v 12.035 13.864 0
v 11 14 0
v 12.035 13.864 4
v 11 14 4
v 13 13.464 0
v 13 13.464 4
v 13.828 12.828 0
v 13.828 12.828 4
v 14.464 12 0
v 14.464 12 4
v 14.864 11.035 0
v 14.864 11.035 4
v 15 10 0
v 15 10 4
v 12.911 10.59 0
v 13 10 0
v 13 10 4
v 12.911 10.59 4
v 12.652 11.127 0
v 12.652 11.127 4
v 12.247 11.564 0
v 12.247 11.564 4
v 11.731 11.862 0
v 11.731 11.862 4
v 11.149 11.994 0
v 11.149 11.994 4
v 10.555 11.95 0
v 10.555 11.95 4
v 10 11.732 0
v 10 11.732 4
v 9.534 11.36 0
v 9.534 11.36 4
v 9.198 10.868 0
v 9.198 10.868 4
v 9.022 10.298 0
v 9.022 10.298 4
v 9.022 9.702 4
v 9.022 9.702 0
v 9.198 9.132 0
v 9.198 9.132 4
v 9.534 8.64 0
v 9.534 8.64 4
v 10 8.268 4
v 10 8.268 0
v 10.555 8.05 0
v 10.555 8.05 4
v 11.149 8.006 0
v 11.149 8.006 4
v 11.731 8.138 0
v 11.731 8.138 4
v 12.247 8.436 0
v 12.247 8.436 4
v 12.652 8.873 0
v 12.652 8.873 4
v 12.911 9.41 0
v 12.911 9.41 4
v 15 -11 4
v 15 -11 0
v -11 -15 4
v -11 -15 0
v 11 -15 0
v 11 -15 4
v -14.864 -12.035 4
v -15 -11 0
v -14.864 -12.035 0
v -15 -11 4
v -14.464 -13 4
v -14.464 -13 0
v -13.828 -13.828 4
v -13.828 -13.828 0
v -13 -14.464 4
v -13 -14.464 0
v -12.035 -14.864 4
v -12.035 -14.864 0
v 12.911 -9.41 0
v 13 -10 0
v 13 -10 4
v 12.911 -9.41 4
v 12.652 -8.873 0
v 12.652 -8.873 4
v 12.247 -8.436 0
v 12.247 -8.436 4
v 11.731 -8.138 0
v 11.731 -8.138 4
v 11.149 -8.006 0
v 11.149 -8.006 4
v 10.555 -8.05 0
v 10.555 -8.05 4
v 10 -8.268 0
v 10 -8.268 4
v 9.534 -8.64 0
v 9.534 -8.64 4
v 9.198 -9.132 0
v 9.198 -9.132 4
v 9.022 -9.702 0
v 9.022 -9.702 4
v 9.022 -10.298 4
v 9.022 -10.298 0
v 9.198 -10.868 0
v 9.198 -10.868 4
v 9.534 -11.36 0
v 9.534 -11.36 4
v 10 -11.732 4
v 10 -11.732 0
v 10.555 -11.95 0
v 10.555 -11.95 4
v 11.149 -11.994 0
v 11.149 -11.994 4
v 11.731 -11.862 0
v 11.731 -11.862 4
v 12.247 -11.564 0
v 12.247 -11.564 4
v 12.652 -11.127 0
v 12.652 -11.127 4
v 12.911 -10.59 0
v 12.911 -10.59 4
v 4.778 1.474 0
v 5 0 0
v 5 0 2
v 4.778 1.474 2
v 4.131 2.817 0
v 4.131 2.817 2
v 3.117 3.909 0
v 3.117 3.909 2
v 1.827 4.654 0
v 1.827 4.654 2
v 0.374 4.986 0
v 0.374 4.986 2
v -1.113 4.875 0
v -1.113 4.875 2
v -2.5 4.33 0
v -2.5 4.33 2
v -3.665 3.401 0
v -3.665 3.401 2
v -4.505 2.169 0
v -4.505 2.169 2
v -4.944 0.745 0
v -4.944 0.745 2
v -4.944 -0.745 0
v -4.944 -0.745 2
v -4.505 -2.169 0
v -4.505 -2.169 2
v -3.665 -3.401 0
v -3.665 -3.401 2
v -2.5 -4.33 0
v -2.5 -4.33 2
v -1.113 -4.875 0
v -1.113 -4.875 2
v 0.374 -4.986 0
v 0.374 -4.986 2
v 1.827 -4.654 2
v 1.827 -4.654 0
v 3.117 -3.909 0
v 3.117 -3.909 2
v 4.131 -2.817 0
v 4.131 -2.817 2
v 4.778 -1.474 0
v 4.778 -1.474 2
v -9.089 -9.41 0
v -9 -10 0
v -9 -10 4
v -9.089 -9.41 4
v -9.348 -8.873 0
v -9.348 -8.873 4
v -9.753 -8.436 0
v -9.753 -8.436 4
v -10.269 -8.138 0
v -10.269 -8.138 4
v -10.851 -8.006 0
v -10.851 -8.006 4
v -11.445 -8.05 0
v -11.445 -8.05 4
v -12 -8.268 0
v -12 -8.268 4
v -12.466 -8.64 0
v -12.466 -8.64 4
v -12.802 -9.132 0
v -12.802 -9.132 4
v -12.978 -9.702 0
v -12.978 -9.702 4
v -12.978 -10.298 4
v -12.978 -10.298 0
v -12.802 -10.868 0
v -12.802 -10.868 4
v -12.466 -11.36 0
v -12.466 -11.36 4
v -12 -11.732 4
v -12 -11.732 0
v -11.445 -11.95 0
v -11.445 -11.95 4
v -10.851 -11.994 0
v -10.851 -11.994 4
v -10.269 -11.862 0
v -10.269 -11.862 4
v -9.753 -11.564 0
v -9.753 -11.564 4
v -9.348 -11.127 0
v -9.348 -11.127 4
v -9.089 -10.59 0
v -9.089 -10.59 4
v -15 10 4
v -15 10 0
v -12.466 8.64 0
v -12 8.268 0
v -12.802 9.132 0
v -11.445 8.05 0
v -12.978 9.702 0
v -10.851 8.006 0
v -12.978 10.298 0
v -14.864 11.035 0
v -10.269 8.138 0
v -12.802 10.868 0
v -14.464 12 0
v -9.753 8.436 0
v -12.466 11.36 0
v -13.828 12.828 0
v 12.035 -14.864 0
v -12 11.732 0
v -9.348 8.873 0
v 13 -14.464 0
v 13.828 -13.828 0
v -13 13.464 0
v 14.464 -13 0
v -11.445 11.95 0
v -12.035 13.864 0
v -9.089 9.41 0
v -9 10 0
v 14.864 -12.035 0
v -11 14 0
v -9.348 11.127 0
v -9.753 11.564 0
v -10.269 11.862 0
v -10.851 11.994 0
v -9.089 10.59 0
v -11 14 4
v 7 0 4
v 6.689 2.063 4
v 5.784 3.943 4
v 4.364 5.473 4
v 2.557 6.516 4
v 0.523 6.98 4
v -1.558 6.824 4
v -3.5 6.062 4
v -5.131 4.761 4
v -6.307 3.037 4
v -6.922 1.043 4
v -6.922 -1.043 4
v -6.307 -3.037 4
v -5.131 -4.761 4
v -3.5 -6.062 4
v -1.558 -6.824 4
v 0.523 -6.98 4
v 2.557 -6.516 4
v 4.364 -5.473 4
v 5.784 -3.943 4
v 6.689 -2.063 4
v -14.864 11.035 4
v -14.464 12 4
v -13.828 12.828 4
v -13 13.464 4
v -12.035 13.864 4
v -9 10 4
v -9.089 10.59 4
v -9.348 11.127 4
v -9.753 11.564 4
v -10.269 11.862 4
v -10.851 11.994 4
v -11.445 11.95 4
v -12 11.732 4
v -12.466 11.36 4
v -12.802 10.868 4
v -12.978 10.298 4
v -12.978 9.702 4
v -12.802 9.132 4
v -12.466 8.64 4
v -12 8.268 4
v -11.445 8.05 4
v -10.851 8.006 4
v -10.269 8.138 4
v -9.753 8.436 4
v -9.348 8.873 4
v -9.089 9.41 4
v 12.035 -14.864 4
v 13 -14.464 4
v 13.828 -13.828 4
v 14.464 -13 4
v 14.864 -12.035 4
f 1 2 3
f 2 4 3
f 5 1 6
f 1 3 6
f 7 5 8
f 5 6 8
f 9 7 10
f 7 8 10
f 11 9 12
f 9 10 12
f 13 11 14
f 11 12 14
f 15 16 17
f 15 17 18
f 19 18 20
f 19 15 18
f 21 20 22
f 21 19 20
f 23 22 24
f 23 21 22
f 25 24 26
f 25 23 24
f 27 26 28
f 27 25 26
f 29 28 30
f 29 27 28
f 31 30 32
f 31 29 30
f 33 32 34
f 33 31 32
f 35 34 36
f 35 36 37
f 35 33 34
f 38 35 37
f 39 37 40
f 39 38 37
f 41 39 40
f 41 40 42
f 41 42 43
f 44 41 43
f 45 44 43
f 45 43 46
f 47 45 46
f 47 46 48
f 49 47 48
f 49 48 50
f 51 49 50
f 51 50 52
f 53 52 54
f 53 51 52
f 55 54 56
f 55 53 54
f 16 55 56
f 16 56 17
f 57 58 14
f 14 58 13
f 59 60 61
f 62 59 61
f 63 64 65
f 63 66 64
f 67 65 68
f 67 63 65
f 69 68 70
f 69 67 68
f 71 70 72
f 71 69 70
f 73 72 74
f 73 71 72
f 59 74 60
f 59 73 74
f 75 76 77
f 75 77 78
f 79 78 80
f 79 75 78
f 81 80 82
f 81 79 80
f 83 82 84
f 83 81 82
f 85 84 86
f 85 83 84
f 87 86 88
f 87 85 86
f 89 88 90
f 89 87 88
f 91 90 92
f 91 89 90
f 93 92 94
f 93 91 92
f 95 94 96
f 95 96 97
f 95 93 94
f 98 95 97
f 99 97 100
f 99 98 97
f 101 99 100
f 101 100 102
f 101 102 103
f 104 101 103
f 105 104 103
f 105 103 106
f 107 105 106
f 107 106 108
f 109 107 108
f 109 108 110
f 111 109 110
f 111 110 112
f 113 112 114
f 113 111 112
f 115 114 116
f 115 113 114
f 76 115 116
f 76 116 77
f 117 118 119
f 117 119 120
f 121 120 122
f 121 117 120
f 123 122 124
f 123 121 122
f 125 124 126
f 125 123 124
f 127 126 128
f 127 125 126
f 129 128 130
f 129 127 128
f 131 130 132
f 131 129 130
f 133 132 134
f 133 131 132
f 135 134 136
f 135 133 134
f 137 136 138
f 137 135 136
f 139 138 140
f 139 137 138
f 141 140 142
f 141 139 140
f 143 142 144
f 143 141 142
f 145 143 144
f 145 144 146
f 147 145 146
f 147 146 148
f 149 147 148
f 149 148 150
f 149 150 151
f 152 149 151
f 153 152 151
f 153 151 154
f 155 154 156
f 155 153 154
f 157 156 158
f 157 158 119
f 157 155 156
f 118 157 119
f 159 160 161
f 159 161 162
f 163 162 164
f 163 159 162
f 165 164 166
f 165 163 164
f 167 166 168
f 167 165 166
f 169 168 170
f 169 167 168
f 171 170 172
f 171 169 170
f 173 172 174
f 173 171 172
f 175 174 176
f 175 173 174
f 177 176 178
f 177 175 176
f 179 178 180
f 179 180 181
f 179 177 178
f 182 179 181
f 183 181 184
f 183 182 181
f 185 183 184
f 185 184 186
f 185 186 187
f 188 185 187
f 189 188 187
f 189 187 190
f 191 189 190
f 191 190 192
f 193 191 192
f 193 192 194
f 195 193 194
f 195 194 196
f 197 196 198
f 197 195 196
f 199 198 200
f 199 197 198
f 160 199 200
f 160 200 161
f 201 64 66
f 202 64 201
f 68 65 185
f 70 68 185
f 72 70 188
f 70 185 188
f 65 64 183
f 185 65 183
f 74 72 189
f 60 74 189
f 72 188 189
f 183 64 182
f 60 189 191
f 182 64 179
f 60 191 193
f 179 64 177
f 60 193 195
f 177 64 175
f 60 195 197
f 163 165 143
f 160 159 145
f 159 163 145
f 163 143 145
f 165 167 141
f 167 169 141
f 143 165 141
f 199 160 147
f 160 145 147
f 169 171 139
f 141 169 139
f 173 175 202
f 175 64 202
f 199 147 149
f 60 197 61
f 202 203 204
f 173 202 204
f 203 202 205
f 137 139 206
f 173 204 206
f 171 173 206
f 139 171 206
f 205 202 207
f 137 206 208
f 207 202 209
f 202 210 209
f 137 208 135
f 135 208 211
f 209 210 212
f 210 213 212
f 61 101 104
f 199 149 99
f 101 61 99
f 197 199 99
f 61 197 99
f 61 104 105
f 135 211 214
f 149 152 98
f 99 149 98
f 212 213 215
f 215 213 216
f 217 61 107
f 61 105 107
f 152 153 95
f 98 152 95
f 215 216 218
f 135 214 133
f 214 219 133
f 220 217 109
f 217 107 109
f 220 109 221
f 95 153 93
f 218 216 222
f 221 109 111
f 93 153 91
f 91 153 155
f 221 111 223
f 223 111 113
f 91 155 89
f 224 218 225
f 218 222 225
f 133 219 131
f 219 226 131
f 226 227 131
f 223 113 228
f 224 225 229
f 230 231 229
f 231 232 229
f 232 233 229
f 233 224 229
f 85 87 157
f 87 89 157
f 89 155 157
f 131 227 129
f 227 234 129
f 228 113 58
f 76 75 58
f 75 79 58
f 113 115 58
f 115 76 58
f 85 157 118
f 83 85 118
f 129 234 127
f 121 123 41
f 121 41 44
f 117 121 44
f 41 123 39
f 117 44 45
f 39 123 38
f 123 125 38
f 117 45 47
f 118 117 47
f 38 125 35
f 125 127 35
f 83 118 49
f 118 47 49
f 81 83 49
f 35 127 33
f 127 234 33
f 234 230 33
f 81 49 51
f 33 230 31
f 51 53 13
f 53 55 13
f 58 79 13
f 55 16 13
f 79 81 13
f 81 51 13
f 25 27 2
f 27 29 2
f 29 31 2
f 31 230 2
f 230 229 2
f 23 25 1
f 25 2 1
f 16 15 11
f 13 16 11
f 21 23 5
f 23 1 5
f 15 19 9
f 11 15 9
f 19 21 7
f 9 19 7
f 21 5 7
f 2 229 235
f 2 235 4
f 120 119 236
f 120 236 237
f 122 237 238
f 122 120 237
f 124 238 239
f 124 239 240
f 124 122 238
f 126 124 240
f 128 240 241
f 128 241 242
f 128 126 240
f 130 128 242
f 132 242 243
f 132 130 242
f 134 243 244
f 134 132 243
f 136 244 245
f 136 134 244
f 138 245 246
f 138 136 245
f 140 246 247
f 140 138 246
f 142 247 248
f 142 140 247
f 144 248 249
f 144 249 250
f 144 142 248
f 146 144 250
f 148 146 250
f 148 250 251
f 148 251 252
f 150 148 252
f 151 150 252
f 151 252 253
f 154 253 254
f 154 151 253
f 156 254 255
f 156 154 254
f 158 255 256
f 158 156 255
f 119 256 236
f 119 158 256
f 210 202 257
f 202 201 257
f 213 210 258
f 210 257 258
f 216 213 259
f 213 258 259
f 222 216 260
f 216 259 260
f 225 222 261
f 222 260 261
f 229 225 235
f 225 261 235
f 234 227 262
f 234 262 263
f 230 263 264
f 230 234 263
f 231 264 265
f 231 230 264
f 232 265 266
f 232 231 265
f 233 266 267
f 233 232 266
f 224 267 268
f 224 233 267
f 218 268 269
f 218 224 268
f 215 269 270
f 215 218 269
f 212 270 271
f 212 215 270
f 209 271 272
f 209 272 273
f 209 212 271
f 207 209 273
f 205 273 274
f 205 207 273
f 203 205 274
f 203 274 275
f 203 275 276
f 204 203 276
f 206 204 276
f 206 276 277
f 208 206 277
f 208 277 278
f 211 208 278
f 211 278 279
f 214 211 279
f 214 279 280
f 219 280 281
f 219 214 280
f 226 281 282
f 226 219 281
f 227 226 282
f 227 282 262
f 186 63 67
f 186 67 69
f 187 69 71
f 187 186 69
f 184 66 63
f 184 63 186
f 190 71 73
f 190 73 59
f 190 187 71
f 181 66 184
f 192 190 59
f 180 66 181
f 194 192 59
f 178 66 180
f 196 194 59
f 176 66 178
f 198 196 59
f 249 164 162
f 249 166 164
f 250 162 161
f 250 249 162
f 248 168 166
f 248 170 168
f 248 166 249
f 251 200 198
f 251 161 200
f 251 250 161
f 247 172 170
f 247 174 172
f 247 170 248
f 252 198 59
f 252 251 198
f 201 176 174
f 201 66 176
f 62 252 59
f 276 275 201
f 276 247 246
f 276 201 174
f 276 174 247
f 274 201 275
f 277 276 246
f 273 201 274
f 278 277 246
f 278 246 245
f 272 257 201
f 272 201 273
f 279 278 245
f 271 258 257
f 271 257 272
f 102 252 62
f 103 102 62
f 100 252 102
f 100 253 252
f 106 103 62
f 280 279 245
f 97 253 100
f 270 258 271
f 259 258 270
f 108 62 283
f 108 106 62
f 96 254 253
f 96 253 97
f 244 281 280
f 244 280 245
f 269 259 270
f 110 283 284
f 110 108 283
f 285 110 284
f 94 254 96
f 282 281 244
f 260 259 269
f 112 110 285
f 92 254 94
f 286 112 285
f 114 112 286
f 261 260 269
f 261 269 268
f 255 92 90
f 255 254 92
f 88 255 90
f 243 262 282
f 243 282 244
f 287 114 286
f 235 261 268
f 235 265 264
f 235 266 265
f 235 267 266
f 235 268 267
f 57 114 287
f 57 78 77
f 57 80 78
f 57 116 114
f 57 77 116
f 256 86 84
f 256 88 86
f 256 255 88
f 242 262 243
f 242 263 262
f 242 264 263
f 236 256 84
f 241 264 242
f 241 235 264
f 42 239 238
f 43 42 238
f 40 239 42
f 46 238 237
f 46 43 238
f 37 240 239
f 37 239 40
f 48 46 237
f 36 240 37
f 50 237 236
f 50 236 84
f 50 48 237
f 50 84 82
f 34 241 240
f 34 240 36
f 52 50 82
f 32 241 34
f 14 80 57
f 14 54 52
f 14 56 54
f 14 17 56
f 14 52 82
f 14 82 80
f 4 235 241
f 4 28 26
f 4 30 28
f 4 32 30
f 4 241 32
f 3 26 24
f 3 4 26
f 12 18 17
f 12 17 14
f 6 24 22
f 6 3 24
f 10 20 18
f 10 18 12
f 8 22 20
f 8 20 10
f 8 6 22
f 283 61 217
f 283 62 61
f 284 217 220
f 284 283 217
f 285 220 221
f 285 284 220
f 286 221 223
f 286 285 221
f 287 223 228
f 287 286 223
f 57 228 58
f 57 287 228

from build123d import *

# Parameters (mm, degrees)
F0_W     = 30
F0_H     = 29
F0_R     = 2
F0_R_2   = 5
F1_DEPTH = 4
F2_R     = 4
F3_SIZE  = 2


with BuildPart() as f1:
    # F0 (on Top) → F1 (new body)
    with BuildSketch(Plane.XY):
        with Locations((0, -0.5)):
            Rectangle(F0_W, F0_H)
        with Locations((-11, -10)):
            Circle(F0_R, mode=Mode.SUBTRACT)
        with Locations((11, -10)):
            Circle(F0_R, mode=Mode.SUBTRACT)
        with Locations((-11, 10)):
            Circle(F0_R, mode=Mode.SUBTRACT)
        Circle(F0_R_2, mode=Mode.SUBTRACT)
        with Locations((11, 10)):
            Circle(F0_R, mode=Mode.SUBTRACT)
    extrude(amount=F1_DEPTH)

    # F2
    f2_edges = [f1.edges().sort_by_distance(p)[0] for p in [
        (-15, 14, 2),
        (15, 14, 2),
        (-15, -15, 2),
        (15, -15, 2),
    ]]
    fillet(f2_edges, radius=F2_R)

    # F3
    f3_edges = [f1.edges().sort_by_distance(p)[0] for p in [
        (-5, 0, 4),
    ]]
    chamfer(f3_edges, length=F3_SIZE)


solid = f1.part
